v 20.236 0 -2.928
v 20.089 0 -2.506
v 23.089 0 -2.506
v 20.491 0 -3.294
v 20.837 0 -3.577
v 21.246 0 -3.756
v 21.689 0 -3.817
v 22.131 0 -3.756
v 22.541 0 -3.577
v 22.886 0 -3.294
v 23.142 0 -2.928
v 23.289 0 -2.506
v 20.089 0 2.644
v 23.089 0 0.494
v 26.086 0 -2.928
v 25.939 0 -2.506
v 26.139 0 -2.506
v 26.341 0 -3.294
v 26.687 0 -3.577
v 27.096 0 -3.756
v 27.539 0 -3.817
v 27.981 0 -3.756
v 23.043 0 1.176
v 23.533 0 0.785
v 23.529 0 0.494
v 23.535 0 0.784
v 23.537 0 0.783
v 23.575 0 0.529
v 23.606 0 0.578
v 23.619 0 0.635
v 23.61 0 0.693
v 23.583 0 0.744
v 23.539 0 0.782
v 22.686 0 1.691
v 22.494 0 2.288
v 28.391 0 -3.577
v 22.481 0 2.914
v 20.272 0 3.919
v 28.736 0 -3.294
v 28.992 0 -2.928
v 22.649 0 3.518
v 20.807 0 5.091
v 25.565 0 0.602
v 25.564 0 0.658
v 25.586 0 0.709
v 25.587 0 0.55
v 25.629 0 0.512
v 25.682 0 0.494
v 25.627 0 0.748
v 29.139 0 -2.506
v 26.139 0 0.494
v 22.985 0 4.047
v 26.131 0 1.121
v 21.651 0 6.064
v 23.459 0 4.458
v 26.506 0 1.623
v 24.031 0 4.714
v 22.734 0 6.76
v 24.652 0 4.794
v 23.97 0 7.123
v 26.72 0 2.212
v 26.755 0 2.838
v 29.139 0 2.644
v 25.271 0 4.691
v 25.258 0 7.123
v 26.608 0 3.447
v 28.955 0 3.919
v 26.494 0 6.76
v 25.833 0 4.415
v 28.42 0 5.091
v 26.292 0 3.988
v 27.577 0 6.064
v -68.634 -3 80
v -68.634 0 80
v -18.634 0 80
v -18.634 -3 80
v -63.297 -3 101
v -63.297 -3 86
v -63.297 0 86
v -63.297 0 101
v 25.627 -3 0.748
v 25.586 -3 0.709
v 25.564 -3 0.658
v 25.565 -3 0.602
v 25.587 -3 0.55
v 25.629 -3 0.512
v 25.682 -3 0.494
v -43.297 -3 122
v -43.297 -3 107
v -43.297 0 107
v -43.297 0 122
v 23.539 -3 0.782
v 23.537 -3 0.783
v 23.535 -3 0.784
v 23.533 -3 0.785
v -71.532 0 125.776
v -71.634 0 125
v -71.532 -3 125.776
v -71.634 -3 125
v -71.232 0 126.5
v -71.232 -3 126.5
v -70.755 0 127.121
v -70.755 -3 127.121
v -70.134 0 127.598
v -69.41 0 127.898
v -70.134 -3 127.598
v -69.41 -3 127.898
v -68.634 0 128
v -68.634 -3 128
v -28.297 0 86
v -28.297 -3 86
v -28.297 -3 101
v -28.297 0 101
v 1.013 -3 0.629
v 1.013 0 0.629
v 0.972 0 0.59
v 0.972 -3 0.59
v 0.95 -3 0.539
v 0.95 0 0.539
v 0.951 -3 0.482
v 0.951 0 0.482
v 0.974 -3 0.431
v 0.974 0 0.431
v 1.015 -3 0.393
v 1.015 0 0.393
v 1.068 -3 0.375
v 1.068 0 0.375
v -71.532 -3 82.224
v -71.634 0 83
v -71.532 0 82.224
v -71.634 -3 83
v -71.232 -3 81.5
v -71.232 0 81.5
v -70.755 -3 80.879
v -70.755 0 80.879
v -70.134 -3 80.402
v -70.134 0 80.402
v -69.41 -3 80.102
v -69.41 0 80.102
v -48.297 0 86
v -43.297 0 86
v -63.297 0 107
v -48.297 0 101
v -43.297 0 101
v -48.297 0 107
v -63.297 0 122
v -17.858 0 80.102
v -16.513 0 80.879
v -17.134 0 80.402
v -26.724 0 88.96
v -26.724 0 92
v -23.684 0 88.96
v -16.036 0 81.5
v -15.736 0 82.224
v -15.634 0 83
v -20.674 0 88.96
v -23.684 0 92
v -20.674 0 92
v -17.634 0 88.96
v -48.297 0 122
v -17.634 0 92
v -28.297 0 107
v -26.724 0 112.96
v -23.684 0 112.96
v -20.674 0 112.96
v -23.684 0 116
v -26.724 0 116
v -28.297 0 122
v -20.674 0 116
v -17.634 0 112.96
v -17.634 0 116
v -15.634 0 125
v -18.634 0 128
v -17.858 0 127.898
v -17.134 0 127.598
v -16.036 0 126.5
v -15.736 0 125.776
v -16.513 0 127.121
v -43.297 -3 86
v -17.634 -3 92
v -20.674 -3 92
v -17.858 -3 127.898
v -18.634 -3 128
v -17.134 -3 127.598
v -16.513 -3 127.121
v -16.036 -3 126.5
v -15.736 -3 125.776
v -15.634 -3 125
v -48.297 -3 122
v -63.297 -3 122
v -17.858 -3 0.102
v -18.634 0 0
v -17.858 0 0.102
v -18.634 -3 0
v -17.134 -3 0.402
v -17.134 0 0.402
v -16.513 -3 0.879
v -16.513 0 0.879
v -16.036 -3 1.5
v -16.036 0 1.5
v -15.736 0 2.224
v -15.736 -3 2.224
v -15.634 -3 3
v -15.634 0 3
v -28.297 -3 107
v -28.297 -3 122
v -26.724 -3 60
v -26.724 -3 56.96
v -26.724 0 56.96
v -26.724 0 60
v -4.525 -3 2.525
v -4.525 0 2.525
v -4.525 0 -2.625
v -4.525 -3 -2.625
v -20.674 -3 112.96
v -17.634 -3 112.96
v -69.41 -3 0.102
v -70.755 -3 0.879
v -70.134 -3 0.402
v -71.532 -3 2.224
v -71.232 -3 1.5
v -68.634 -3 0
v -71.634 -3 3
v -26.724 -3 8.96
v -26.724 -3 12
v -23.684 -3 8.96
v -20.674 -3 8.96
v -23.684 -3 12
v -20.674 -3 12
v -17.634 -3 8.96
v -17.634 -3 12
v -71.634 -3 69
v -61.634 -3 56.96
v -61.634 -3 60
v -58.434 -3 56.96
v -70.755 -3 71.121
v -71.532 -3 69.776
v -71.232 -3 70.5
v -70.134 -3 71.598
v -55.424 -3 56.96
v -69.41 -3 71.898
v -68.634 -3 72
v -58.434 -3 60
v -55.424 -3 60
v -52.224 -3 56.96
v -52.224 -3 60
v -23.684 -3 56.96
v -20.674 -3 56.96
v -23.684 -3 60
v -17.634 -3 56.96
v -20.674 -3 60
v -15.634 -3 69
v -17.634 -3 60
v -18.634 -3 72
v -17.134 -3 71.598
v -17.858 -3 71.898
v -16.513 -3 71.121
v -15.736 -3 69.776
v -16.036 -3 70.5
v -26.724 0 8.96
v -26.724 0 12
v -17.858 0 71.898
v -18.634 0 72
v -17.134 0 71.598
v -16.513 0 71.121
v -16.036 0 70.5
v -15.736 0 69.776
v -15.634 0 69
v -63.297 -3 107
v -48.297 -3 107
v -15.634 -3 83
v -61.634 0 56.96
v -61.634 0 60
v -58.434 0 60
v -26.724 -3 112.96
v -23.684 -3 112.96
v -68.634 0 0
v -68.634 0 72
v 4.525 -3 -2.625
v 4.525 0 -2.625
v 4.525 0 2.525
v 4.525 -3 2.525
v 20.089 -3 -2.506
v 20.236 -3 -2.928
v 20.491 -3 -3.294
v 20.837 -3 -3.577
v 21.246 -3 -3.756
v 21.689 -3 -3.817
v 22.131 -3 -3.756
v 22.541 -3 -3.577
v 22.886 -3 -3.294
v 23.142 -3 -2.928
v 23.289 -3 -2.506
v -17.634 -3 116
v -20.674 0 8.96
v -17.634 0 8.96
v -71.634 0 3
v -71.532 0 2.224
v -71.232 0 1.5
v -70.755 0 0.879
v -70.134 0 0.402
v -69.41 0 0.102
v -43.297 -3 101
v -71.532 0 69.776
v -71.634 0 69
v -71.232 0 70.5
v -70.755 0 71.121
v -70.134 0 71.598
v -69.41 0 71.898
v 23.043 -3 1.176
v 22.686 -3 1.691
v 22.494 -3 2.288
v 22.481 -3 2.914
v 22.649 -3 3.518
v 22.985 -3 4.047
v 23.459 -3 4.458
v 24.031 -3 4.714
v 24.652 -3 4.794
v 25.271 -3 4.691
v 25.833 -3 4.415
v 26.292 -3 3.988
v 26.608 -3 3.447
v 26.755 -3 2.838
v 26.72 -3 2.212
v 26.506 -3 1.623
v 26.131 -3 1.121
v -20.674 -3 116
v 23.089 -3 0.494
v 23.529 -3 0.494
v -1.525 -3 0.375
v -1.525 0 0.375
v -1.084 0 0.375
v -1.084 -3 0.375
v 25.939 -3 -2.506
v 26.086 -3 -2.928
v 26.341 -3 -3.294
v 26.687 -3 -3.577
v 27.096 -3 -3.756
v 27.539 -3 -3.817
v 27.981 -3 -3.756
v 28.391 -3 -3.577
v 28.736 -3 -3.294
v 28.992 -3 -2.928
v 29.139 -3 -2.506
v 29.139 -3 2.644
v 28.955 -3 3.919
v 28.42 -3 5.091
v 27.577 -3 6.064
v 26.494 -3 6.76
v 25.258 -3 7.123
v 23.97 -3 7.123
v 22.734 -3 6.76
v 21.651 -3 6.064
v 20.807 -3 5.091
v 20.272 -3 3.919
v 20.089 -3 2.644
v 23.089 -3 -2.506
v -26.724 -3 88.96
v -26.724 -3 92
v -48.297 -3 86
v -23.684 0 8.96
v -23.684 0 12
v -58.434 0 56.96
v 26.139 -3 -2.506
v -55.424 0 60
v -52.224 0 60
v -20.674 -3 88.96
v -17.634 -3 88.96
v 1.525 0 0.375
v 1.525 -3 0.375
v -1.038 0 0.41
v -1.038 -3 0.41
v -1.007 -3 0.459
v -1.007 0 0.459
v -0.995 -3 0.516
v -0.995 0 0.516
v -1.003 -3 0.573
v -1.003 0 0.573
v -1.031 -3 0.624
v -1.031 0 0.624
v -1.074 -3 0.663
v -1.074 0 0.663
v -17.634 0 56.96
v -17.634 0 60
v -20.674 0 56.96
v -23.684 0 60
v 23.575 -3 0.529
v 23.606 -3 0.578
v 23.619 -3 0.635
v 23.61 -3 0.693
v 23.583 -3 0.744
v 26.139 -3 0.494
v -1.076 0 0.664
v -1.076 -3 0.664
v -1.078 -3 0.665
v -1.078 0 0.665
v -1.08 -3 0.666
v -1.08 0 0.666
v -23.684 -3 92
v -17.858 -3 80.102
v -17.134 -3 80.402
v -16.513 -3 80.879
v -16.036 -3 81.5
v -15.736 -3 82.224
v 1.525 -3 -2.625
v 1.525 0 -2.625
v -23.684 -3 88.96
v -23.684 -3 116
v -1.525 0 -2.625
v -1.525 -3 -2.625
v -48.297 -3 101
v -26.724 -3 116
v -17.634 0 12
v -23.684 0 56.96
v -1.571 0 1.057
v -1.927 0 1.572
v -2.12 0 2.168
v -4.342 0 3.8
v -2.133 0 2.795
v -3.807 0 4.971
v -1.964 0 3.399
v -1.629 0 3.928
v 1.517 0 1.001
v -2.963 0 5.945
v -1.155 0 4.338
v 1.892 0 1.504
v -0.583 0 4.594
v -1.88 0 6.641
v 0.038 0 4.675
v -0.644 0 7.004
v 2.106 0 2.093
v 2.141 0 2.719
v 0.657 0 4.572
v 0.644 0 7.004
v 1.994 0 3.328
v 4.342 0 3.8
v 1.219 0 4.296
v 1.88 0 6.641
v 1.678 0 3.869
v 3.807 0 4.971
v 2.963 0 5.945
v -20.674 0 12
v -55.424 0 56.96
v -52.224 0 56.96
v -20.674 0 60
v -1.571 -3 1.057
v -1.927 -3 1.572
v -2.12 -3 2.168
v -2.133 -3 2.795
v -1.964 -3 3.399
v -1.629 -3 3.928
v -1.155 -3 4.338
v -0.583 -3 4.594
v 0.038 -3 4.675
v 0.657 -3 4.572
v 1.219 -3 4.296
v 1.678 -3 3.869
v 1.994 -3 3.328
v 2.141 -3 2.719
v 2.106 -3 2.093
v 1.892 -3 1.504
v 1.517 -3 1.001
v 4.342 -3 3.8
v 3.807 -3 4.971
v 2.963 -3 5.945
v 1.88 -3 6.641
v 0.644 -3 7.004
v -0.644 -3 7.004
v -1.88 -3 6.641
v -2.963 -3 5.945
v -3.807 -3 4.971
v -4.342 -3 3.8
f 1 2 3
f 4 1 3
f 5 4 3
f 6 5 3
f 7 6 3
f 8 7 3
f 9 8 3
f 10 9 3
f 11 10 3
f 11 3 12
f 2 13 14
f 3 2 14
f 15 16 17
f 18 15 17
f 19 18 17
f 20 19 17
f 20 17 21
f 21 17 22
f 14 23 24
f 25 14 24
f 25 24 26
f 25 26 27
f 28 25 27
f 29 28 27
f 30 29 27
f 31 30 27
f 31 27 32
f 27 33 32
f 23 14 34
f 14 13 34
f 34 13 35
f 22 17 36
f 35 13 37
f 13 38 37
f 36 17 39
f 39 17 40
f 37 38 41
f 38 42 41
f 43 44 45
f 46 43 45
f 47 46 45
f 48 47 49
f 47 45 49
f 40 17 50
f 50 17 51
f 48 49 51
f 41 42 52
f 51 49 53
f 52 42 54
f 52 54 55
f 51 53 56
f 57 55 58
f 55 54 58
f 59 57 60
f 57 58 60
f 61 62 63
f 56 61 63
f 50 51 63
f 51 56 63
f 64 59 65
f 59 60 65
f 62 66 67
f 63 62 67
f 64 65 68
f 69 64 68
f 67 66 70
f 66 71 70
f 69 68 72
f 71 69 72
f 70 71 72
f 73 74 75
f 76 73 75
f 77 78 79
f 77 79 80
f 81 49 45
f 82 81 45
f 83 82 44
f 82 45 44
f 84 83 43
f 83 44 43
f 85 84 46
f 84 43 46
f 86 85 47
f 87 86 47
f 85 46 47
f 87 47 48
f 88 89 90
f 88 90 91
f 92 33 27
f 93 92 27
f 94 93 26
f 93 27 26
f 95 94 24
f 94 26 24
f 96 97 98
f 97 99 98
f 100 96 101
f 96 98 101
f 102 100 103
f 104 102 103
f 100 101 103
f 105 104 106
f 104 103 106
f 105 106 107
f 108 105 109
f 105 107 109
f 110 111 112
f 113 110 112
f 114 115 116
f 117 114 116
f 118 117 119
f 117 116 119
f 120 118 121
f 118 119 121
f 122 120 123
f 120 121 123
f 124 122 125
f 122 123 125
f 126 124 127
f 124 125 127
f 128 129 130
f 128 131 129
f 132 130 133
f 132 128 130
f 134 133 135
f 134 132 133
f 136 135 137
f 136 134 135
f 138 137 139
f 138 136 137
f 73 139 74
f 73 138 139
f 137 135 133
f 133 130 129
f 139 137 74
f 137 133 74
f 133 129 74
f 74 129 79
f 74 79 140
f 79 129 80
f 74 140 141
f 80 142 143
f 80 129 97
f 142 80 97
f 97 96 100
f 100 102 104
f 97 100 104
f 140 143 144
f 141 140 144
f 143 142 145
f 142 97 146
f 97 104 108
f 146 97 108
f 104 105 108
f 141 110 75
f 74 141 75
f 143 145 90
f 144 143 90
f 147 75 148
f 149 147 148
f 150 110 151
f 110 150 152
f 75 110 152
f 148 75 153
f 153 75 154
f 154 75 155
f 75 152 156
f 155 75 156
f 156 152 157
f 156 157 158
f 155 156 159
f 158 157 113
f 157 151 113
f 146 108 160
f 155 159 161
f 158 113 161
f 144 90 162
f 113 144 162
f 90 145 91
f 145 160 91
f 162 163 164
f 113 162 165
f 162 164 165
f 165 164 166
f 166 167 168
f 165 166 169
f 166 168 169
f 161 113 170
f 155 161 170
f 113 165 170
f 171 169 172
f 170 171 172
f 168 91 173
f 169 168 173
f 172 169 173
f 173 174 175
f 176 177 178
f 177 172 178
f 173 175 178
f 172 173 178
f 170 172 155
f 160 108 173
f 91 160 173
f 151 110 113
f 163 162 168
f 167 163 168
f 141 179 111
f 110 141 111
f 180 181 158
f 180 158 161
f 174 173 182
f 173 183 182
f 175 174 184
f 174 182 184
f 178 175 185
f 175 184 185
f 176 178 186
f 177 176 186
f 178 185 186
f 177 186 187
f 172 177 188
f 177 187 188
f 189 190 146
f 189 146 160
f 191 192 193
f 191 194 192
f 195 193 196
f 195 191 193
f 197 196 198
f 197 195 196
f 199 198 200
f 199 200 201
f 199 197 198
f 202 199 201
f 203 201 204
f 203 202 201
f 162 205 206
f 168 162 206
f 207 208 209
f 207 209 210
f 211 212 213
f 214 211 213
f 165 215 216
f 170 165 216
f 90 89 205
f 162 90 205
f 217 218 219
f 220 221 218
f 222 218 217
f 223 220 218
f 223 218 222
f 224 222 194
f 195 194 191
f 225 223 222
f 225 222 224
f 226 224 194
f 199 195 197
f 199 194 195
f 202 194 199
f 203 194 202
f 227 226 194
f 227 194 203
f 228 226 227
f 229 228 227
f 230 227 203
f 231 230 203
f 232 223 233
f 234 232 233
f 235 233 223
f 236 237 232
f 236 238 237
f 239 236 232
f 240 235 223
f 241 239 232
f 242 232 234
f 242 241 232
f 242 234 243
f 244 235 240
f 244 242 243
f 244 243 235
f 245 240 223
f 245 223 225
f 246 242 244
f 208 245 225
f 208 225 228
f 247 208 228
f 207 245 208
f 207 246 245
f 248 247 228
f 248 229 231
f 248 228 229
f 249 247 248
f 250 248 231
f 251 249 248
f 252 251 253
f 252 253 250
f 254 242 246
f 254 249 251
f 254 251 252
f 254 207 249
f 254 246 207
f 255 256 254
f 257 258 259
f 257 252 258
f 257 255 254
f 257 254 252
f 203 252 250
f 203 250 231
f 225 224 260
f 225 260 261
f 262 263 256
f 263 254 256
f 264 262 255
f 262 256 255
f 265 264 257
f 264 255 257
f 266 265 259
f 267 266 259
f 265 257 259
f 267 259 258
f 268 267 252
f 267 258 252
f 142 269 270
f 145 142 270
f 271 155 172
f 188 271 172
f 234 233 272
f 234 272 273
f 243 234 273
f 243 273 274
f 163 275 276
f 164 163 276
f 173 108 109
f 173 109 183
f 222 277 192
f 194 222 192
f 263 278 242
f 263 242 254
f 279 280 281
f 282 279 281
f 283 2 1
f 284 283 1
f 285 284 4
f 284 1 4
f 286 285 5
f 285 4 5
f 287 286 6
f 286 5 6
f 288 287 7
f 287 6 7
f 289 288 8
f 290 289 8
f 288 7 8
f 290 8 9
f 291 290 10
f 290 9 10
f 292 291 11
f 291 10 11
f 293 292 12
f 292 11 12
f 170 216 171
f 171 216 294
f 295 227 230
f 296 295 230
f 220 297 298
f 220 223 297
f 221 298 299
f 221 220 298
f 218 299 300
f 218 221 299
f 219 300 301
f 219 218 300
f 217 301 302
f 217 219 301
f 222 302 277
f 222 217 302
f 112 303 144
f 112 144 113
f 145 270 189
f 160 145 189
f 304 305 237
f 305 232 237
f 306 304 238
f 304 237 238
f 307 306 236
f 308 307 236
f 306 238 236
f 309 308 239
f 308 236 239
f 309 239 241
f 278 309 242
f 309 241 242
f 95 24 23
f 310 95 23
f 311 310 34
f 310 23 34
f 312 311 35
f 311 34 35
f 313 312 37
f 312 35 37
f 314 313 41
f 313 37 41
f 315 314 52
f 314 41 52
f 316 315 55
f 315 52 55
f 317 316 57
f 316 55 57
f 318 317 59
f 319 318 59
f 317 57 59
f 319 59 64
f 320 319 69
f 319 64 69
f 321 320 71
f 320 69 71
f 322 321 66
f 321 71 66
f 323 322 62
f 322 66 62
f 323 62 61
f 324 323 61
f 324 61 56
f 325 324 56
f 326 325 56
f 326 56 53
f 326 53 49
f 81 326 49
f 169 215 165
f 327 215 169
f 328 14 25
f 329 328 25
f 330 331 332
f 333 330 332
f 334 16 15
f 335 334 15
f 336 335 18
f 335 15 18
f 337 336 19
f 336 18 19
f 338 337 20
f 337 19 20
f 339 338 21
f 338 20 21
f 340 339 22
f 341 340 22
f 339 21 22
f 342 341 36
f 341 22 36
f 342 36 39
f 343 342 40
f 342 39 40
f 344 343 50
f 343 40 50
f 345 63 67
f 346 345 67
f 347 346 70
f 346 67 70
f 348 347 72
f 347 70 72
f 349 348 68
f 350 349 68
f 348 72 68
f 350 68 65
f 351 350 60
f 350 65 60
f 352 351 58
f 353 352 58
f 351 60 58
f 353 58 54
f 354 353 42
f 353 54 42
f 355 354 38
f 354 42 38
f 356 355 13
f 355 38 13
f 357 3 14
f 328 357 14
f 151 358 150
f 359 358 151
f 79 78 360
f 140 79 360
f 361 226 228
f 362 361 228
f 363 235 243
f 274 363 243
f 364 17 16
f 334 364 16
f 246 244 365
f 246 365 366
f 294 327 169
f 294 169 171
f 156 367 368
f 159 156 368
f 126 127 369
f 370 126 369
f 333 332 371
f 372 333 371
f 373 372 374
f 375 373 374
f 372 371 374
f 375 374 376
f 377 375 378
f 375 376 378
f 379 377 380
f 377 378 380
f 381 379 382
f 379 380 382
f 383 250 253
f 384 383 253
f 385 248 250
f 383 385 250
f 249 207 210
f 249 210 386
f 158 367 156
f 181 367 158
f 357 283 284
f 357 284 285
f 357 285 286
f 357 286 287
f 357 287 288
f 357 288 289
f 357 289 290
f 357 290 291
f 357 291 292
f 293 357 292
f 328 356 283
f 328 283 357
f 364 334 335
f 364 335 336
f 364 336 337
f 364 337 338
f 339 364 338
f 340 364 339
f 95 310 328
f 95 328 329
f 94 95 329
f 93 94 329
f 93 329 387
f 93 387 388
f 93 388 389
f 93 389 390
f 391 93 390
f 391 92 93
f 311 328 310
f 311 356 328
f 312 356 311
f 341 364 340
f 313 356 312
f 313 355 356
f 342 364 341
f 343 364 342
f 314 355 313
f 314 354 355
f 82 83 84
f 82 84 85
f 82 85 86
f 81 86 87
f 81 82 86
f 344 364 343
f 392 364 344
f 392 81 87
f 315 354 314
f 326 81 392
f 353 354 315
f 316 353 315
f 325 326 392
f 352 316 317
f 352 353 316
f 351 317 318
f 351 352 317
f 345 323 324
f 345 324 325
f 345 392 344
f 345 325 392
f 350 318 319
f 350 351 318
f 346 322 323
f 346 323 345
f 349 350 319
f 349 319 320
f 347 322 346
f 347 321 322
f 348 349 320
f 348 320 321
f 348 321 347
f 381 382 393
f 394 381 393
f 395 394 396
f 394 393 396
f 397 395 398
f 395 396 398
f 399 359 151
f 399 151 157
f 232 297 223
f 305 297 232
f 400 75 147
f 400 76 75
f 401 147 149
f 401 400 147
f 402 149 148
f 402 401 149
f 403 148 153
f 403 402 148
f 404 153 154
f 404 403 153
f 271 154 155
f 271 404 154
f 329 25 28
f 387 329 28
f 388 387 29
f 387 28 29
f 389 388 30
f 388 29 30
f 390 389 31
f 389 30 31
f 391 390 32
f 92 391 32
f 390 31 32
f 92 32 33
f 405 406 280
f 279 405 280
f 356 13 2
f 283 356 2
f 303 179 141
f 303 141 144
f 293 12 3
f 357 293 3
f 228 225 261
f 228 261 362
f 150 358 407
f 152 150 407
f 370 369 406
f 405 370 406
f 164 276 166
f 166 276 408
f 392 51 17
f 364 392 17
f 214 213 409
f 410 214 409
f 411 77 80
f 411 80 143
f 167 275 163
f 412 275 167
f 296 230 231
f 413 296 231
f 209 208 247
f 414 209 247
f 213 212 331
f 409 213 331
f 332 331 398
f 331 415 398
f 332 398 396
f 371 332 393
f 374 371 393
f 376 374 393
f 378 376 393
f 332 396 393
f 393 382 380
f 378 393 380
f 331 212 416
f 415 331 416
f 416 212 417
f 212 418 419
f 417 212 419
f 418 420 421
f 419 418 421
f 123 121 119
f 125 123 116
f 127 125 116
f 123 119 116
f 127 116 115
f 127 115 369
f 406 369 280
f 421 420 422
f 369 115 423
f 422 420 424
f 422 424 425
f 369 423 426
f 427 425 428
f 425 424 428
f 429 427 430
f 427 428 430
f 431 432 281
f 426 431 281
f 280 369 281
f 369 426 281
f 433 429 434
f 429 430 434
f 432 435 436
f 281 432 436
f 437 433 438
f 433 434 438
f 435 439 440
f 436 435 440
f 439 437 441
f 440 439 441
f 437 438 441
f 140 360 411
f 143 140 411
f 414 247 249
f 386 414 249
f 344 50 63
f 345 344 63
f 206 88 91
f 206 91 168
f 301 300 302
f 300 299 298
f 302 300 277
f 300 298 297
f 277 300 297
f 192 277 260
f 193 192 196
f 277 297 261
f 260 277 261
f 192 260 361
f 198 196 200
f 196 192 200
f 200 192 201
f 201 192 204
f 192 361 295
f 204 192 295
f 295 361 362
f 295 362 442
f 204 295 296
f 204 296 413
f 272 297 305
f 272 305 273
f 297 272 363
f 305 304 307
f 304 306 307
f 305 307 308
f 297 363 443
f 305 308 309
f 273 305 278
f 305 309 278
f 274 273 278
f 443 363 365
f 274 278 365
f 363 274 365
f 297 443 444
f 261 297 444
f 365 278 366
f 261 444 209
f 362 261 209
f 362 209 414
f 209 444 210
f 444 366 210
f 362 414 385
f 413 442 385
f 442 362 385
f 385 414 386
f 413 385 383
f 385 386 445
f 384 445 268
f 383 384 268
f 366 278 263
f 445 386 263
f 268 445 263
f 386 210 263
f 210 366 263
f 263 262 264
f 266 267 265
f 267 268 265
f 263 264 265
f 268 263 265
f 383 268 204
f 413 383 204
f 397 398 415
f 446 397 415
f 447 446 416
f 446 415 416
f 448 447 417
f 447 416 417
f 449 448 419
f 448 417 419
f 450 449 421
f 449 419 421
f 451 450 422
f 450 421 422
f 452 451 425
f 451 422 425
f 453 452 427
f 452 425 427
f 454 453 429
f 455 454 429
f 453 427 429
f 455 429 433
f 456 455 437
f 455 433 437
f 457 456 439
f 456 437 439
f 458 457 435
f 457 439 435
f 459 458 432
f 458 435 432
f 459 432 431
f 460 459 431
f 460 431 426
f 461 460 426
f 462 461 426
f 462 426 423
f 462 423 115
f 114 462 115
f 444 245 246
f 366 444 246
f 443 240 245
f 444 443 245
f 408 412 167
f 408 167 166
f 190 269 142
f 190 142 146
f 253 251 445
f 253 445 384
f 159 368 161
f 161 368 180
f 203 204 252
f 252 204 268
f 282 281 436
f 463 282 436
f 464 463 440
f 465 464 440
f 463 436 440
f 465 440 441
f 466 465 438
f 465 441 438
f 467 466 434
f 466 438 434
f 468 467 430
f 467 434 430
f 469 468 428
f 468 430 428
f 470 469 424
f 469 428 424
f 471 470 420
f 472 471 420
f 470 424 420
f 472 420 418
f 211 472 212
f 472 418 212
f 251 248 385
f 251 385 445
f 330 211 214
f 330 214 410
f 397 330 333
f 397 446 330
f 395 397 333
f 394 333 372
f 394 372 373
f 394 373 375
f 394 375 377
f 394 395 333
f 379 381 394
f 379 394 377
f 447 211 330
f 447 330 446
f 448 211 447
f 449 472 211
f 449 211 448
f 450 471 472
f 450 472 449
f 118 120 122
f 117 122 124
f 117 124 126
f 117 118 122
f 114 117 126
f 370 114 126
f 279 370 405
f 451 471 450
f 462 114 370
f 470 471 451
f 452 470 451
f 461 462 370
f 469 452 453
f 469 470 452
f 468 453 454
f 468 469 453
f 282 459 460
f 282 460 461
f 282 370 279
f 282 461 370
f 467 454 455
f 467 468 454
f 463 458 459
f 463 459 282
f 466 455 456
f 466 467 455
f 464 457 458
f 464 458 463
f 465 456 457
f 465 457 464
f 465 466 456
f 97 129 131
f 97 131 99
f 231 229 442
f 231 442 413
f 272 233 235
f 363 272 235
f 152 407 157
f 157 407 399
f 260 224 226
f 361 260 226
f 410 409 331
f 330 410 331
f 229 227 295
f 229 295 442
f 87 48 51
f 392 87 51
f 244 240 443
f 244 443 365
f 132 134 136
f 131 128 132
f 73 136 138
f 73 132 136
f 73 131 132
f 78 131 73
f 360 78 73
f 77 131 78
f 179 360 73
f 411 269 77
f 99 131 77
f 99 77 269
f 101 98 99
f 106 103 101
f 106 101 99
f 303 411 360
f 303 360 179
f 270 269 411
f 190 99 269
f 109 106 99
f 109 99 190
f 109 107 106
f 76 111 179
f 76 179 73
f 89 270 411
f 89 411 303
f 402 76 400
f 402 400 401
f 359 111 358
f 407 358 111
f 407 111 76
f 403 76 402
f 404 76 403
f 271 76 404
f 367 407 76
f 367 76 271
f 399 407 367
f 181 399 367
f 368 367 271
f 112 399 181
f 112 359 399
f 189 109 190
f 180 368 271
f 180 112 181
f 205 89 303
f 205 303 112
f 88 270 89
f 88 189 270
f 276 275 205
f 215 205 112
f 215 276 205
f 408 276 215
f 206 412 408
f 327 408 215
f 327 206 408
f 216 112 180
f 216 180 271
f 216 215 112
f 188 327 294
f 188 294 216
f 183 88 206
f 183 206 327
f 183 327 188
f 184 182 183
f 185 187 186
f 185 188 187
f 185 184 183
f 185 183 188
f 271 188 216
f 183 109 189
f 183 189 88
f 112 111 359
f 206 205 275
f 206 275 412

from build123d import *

# Parameters (mm, degrees)
F1_DEPTH = 3
F2_W     = 56
F2_H     = 48
F2_H_2   = 72
F3_DEPTH = 3
F4_W     = 3.04
F4_H     = 3.04
F5_DEPTH = 3.001
F4_W_2   = 3.2
F6_DEPTH = 25
F7_W     = 15
F7_H     = 15
F8_DEPTH = 3.001
F9_R     = 3


with BuildPart() as f1:
    # F0 (on Front) → F1 (new body)
    with BuildSketch(Plane.XZ):
        with BuildLine():
            ThreePointArc((-1.080397, 0.666172), (0.03848, 4.674656), (1.013178, 0.628695))
            ThreePointArc((1.013178, 0.628695), (0.950886, 0.482418), (1.068098, 0.375))
            Line((1.068098, 0.375), (1.1027, 0.375))
            Line((1.1027, 0.375), (1.525, 0.375))
            Line((1.525, 0.375), (1.525, -2.625))
            Line((1.525, -2.625), (4.525, -2.625))
            Line((4.525, -2.625), (4.525, 2.525))
            ThreePointArc((4.525, 2.525), (0, 7.05), (-4.525, 2.525))
            Line((-4.525, 2.525), (-4.525, -2.625))
            Line((-4.525, -2.625), (-1.525, -2.625))
            Line((-1.525, -2.625), (-1.525, 0.375))
            Line((-1.525, 0.375), (-1.084463, 0.375))
            ThreePointArc((-1.084463, 0.375), (-0.995149, 0.515884), (-1.074369, 0.662681))
            ThreePointArc((-1.074369, 0.662681), (-1.077384, 0.664424), (-1.080397, 0.666172))
        make_face()
        with BuildLine():
            ThreePointArc((23.533366, 0.785405), (24.652243, 4.793889), (25.626941, 0.747928))
            ThreePointArc((25.626941, 0.747928), (25.564649, 0.601651), (25.681861, 0.494233))
            Line((25.681861, 0.494233), (25.716464, 0.494233))
            Line((25.716464, 0.494233), (26.138763, 0.494233))
            Line((26.138763, 0.494233), (26.138763, -2.505767))
            Line((26.138763, -2.505767), (25.938763, -2.505767))
            ThreePointArc((25.938763, -2.505767), (27.538763, -3.817453), (29.138763, -2.505767))
            Line((29.138763, -2.505767), (29.138763, 2.644233))
            ThreePointArc((29.138763, 2.644233), (24.613763, 7.169233), (20.088763, 2.644233))
            Line((20.088763, 2.644233), (20.088763, -2.505767))
            ThreePointArc((20.088763, -2.505767), (21.688763, -3.817453), (23.288763, -2.505767))
            Line((23.288763, -2.505767), (23.088763, -2.505767))
            Line((23.088763, -2.505767), (23.088763, 0.494233))
            Line((23.088763, 0.494233), (23.5293, 0.494233))
            ThreePointArc((23.5293, 0.494233), (23.618614, 0.635117), (23.539394, 0.781914))
            ThreePointArc((23.539394, 0.781914), (23.536379, 0.783657), (23.533366, 0.785405))
        make_face()
    extrude(amount=F1_DEPTH)


with BuildPart() as f3:
    # F2 (on Front) → F3 (new body)
    with BuildSketch(Plane.XZ):
        with Locations((-43.634039, 104)):
            Rectangle(F2_W, F2_H)
        with Locations((-43.634039, 36)):
            Rectangle(F2_W, F2_H_2)
    extrude(amount=F3_DEPTH)

    # F4 (on face) → F5 (cut, through all)
    with BuildSketch(Plane.XZ.offset(3)):
        with Locations((-25.204039, 114.48)):
            Rectangle(F4_W, F4_H)
        with Locations((-19.154039, 114.48)):
            Rectangle(F4_W, F4_H)
        with Locations((-25.204039, 90.48)):
            Rectangle(F4_W, F4_H)
        with Locations((-19.154039, 90.48)):
            Rectangle(F4_W, F4_H)
        with Locations((-25.204039, 58.48)):
            Rectangle(F4_W, F4_H)
        with Locations((-19.154039, 58.48)):
            Rectangle(F4_W, F4_H)
        with Locations((-25.204039, 10.48)):
            Rectangle(F4_W, F4_H)
        with Locations((-19.154039, 10.48)):
            Rectangle(F4_W, F4_H)
    extrude(amount=-F5_DEPTH, mode=Mode.SUBTRACT)

    # F4 (on face) → F6 (cut)
    with BuildSketch(Plane.XZ.offset(3)):
        with Locations((-25.204039, 10.48)):
            Rectangle(F4_W, F4_H)
        with Locations((-19.154039, 10.48)):
            Rectangle(F4_W, F4_H)
        with Locations((-25.204039, 58.48)):
            Rectangle(F4_W, F4_H)
        with Locations((-19.154039, 58.48)):
            Rectangle(F4_W, F4_H)
        with Locations((-25.204039, 90.48)):
            Rectangle(F4_W, F4_H)
        with Locations((-19.154039, 90.48)):
            Rectangle(F4_W, F4_H)
        with Locations((-25.204039, 114.48)):
            Rectangle(F4_W, F4_H)
        with Locations((-19.154039, 114.48)):
            Rectangle(F4_W, F4_H)
        with Locations((-60.034039, 58.48)):
            Rectangle(F4_W_2, F4_H)
        with Locations((-53.824039, 58.48)):
            Rectangle(F4_W_2, F4_H)
    extrude(amount=-F6_DEPTH, mode=Mode.SUBTRACT)

    # F7 (on face) → F8 (cut, through all)
    with BuildSketch(Plane.XZ.offset(3)):
        with Locations((-55.797357, 114.5)):
            Rectangle(F7_W, F7_H)
        with Locations((-35.797357, 114.5)):
            Rectangle(F7_W, F7_H)
        with Locations((-35.797357, 93.5)):
            Rectangle(F7_W, F7_H)
        with Locations((-55.797357, 93.5)):
            Rectangle(F7_W, F7_H)
    extrude(amount=-F8_DEPTH, mode=Mode.SUBTRACT)

    # F9
    f9_edges = [f3.edges().sort_by_distance(p)[0] for p in [
        (-71.634039, -1.5, 128),
        (-71.634039, -1.5, 72),
        (-15.634039, -1.5, 72),
        (-71.634039, -1.5, 80),
        (-15.634039, -1.5, 80),
        (-15.634039, -1.5, 128),
        (-71.634039, -1.5, 0),
        (-15.634039, -1.5, 0),
    ]]
    fillet(f9_edges, radius=F9_R)


solid = Compound([f1.part, f3.part])
